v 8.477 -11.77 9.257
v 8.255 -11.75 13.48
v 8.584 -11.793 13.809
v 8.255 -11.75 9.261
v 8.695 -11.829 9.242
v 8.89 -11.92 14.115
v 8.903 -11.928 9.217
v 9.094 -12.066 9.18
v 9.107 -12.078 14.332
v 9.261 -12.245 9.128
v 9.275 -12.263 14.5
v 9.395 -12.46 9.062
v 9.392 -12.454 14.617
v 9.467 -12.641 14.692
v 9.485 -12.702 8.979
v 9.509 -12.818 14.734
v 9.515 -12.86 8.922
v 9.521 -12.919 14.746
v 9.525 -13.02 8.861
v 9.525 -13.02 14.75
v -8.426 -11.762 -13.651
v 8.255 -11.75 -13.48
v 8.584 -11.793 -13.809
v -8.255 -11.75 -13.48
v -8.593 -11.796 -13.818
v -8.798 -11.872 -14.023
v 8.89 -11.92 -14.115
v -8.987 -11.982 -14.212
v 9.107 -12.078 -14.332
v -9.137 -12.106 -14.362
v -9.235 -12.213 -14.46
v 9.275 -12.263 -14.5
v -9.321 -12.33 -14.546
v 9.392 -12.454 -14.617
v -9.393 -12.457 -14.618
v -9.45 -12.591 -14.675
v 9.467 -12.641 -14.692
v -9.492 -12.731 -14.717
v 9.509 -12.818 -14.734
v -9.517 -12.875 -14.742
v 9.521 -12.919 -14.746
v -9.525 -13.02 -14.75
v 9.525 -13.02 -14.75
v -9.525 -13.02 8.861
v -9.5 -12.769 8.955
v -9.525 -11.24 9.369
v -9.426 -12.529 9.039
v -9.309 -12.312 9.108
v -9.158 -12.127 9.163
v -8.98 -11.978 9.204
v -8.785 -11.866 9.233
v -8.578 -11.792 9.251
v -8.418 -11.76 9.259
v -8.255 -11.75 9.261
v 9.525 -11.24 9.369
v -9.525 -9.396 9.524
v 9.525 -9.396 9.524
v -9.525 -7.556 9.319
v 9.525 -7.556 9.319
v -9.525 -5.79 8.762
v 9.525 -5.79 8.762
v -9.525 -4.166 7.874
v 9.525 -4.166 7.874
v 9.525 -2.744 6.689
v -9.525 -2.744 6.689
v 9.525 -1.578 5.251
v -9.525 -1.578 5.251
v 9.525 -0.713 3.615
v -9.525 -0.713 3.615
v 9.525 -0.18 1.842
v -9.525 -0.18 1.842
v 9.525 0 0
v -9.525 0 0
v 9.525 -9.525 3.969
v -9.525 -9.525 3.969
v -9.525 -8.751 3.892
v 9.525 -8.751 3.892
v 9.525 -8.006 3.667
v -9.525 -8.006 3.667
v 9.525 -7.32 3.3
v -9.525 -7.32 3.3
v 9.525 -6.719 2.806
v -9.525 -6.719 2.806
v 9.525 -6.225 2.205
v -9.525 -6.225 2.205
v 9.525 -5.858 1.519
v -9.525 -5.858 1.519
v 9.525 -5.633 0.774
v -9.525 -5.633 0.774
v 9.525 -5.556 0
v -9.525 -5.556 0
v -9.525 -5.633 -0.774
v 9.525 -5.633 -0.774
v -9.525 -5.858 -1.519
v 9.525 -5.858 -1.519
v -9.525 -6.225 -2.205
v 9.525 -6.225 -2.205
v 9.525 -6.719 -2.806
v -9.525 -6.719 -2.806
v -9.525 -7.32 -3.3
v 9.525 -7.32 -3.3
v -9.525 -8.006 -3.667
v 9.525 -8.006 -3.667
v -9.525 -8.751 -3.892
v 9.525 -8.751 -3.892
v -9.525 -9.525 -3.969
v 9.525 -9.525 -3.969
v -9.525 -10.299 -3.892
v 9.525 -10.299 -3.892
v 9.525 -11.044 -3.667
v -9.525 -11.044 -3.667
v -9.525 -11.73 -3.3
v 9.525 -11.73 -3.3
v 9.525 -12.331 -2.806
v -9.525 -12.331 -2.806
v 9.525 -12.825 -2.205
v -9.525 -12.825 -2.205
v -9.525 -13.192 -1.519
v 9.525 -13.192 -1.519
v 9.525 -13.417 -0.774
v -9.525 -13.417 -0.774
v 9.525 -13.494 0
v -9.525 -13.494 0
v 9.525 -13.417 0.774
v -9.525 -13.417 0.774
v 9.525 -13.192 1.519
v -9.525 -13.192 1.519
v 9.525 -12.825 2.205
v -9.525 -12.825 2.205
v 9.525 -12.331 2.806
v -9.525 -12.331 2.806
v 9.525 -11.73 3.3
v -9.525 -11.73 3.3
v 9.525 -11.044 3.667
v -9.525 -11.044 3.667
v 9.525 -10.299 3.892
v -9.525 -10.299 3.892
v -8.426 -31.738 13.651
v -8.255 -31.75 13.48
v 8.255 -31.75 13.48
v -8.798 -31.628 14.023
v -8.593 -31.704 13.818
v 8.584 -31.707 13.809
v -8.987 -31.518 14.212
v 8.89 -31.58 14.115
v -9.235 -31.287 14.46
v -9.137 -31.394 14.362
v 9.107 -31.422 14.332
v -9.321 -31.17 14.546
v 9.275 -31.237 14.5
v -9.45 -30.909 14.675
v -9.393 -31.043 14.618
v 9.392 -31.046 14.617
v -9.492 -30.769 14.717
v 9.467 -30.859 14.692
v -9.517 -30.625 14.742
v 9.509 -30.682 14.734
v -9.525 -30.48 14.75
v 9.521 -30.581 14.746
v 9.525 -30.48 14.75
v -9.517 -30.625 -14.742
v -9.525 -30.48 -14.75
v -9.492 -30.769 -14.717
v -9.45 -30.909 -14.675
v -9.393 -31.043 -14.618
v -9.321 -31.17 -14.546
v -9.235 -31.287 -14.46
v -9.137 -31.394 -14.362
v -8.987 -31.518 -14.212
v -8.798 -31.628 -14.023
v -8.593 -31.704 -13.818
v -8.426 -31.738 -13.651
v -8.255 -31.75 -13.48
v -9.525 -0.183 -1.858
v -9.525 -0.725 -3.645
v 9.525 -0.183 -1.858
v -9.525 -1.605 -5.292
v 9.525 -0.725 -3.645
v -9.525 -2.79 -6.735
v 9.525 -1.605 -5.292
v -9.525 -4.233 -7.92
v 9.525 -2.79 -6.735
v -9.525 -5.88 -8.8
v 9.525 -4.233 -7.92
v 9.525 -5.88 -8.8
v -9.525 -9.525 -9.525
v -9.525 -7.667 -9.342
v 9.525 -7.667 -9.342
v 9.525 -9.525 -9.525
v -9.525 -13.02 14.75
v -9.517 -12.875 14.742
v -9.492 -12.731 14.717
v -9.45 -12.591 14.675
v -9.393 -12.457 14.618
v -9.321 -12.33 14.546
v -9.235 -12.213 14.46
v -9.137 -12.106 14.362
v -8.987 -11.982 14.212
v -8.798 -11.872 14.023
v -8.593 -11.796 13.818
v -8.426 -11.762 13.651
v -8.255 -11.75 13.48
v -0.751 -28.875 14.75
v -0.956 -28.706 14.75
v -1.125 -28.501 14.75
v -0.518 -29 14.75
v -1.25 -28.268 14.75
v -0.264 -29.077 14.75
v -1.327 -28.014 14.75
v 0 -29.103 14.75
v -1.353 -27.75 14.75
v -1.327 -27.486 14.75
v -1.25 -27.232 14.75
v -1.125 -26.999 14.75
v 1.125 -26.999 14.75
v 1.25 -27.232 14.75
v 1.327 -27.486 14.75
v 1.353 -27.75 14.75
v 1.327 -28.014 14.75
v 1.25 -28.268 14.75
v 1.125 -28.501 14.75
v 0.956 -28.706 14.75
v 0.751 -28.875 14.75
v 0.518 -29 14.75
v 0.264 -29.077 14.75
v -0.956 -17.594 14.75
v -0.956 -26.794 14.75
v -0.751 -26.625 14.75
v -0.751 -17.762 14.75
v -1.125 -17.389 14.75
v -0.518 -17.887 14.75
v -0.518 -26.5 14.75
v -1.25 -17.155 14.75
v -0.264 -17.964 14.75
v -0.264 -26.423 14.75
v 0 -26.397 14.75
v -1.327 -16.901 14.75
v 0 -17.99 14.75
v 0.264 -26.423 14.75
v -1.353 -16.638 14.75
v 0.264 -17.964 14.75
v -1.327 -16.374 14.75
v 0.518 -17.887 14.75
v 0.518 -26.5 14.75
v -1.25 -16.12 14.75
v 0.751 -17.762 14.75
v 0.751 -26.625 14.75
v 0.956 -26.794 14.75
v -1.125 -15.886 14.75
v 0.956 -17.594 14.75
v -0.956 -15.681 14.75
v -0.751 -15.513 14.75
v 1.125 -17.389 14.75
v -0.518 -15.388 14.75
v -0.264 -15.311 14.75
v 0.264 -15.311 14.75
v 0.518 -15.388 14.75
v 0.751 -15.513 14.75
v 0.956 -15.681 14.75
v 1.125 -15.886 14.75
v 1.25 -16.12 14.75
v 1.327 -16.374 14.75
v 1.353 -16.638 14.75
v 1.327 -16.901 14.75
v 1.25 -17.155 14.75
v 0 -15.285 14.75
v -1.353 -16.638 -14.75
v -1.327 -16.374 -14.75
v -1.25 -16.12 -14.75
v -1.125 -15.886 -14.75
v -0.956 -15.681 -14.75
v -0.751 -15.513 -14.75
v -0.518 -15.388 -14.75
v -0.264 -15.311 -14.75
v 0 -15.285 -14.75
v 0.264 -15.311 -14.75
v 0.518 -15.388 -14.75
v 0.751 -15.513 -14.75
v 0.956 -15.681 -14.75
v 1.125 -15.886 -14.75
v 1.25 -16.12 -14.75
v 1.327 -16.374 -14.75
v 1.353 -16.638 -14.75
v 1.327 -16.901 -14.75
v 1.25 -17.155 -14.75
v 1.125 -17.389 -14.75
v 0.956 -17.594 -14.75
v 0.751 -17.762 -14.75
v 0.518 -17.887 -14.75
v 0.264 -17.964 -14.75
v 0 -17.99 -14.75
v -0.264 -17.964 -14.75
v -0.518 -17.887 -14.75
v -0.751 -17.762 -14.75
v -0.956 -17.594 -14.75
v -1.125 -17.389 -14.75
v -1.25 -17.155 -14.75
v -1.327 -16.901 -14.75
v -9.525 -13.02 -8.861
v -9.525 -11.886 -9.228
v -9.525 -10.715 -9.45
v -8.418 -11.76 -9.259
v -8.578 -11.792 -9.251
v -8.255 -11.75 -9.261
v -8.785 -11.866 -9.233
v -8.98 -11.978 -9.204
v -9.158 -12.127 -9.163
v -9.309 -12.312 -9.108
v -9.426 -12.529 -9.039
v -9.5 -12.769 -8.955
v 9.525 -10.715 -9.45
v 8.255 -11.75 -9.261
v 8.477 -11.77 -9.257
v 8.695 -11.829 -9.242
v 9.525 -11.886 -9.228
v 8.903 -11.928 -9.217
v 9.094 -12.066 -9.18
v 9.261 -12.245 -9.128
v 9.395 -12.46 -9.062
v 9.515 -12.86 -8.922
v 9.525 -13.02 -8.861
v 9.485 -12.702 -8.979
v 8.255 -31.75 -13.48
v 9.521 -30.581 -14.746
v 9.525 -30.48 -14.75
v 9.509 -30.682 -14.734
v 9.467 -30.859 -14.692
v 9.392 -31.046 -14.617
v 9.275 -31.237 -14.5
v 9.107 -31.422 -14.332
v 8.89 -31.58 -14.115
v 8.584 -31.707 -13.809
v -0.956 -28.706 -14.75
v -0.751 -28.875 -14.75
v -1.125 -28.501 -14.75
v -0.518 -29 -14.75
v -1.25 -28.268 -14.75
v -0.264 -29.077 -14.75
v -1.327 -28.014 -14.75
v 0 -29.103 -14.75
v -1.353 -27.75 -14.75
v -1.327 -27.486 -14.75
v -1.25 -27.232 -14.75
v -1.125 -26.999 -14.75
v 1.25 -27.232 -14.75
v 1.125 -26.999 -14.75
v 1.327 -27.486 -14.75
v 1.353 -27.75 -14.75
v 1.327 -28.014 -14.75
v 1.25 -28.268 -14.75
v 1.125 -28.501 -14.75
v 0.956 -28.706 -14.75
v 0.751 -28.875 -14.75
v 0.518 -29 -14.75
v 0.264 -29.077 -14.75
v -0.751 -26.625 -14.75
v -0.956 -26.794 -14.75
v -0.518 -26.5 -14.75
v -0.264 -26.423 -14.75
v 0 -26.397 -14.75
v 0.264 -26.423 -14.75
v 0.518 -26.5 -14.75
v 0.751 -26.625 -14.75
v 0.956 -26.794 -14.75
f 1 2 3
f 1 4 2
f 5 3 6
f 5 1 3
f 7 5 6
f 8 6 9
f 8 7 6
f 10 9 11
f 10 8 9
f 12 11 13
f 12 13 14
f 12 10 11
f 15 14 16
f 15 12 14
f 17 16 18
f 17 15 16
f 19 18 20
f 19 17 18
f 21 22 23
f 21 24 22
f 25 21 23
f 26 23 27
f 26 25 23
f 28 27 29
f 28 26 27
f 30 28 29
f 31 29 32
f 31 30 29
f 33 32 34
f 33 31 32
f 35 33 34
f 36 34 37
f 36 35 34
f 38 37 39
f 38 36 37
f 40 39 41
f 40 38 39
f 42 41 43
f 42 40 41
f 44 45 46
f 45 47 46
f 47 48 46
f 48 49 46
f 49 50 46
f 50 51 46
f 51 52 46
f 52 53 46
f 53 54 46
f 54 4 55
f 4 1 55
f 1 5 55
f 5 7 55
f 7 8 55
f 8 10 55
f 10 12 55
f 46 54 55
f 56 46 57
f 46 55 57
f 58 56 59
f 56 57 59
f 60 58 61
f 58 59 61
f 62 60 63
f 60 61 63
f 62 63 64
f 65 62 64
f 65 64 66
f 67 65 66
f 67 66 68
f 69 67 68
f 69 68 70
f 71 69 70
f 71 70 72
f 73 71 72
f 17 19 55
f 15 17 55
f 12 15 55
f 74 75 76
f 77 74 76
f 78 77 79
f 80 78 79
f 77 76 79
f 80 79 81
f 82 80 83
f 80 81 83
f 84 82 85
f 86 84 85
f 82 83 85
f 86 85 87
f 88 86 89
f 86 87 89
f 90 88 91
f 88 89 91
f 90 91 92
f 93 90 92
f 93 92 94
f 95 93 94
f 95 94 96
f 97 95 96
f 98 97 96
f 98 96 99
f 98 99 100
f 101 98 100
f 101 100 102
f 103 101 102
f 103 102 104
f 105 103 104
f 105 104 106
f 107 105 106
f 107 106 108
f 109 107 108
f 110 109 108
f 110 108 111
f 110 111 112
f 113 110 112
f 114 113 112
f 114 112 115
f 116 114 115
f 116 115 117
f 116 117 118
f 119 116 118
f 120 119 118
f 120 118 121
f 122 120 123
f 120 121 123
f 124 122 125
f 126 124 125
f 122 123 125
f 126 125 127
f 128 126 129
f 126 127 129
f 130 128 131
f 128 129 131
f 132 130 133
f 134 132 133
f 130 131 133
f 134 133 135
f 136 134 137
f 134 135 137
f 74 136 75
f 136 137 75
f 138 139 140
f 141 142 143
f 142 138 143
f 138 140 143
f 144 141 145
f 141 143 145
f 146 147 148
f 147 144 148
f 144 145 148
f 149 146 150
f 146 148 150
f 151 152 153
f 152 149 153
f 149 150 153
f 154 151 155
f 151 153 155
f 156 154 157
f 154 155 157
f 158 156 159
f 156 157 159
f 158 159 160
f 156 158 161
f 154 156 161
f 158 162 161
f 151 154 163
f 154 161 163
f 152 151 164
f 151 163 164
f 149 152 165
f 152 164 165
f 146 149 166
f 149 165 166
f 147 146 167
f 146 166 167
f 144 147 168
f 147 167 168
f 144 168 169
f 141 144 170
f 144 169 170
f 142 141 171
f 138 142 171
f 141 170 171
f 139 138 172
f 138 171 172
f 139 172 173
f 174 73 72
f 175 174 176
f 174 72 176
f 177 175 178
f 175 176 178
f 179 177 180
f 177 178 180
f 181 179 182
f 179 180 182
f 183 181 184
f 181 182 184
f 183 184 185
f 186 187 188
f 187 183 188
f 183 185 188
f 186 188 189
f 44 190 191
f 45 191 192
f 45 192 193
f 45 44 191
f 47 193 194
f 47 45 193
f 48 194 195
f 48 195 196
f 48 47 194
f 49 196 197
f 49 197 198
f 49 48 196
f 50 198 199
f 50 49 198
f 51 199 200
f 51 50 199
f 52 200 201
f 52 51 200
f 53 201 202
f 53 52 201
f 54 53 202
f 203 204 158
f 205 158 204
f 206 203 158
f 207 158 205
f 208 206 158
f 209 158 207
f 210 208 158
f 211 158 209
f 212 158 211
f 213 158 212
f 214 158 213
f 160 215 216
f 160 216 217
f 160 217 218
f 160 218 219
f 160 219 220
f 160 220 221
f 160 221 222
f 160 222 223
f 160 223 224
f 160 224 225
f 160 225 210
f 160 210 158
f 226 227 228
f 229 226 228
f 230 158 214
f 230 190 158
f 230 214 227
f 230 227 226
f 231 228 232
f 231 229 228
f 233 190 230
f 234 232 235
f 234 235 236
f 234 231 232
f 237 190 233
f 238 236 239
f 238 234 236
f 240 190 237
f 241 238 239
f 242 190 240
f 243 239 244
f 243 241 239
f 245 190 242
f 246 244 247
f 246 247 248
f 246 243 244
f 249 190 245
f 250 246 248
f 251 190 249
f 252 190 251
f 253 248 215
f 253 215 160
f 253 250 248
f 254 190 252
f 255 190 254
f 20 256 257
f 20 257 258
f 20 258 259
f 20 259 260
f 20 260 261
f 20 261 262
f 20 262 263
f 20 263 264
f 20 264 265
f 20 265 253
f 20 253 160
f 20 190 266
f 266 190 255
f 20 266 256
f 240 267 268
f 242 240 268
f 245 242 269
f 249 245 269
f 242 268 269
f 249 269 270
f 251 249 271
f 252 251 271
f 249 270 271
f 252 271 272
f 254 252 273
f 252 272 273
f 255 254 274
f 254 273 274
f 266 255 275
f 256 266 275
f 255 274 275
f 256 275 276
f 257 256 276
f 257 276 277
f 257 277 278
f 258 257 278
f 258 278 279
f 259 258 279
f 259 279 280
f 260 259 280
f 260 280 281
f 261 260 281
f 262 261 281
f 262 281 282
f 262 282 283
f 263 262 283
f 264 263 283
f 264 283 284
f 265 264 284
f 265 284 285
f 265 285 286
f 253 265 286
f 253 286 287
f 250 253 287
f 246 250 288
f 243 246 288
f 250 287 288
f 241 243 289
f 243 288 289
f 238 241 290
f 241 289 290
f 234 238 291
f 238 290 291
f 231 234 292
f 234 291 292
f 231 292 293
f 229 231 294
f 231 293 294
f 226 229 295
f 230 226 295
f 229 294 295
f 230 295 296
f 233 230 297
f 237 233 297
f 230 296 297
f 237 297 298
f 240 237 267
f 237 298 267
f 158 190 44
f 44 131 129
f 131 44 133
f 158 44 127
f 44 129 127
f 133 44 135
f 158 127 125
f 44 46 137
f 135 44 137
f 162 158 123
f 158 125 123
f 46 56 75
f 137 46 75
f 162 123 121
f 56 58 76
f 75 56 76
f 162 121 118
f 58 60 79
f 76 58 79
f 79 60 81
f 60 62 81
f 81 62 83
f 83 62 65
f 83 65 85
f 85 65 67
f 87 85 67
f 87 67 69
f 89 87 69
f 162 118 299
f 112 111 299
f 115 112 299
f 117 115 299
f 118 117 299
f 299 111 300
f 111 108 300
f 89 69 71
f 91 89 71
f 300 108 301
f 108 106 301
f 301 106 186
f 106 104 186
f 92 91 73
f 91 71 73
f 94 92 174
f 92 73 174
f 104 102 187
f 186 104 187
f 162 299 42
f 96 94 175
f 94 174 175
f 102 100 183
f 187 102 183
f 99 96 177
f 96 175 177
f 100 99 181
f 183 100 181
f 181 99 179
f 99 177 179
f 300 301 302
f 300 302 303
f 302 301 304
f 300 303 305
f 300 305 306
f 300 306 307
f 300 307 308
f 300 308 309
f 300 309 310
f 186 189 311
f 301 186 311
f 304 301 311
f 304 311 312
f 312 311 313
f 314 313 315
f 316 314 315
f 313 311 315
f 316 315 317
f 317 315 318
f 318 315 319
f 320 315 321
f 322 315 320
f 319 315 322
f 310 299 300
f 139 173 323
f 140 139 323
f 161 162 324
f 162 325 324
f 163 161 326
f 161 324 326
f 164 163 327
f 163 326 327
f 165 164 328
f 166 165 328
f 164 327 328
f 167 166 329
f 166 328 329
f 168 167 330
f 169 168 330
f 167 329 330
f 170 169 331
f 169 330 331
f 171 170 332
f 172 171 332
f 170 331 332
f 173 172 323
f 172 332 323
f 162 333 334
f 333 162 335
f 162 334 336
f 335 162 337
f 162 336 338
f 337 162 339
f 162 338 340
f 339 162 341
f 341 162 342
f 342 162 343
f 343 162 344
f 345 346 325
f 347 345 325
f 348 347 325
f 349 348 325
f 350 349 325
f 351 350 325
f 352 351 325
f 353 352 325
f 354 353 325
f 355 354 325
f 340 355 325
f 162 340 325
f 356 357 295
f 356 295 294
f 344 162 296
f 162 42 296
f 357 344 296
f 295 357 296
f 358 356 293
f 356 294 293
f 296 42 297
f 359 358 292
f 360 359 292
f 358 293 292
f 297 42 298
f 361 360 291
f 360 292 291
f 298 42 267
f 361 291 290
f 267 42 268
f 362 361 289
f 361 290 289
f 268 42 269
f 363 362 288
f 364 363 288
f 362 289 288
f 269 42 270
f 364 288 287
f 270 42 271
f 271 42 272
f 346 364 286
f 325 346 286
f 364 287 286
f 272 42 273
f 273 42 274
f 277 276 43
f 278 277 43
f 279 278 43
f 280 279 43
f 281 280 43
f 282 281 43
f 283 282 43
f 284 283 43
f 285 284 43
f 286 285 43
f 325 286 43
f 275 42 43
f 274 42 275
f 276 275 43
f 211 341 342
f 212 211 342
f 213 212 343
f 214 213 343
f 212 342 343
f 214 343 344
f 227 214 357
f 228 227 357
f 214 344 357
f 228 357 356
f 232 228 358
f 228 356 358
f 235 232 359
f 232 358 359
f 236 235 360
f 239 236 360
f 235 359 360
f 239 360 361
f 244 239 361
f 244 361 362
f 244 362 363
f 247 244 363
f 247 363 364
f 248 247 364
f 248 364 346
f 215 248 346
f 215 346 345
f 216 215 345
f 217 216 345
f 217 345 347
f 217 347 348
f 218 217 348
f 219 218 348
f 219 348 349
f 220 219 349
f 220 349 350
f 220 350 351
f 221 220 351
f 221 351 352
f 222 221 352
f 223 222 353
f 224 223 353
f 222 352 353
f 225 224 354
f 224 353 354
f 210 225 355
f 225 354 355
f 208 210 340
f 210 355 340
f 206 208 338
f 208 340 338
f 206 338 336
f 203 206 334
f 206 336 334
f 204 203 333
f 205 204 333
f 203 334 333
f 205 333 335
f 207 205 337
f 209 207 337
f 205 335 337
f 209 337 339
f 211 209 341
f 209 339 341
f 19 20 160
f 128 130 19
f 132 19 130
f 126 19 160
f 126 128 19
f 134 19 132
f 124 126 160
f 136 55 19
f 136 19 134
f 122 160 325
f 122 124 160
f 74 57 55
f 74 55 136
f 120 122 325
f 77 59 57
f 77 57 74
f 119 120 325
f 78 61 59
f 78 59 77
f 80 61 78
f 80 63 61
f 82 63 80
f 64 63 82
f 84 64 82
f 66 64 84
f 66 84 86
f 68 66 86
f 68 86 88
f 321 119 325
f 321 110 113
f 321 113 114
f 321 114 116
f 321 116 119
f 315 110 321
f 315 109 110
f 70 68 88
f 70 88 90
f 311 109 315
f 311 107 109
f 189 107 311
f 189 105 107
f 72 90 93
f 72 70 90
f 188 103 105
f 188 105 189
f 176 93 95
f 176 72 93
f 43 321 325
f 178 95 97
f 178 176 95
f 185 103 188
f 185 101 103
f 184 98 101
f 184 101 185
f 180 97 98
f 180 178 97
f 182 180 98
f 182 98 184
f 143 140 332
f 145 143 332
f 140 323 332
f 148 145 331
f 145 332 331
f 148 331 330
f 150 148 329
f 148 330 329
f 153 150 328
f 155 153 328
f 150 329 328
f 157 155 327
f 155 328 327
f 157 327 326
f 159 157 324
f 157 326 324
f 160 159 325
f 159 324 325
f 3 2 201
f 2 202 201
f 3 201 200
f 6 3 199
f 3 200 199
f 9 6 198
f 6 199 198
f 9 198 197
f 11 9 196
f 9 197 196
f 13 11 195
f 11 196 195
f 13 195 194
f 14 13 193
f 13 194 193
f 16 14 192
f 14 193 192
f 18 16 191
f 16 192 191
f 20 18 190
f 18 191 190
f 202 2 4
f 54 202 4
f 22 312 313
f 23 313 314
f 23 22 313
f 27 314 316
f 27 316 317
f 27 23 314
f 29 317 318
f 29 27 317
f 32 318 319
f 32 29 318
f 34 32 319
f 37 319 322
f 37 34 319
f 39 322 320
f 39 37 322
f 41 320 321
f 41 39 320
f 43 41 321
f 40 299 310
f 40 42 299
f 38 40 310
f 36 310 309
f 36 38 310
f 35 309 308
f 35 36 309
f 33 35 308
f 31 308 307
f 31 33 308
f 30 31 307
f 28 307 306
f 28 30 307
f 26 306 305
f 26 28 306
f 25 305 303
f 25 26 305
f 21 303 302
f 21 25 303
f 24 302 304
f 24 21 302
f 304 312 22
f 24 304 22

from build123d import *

# Parameters (mm, degrees)
SKETCH1_W             = 19.05
SKETCH1_H             = 29.5
BODY_DEPTH            = 31.75
SKETCH8_R             = 3.96875
AXLE_HOLE_DEPTH       = 40.856335757
F_6_32_TAPPED_HOLE1_D = 2.7051
ROUND_OVER_DEPTH      = 40.856335757
FILLET1_R             = 1.27


with BuildPart() as part:
    # Sketch1 → Body (new body)
    with BuildSketch(Plane(origin=(0, 0, 0), x_dir=(1, 0, 0), z_dir=(0, 1, 0))):
        Rectangle(SKETCH1_W, SKETCH1_H)
    extrude(amount=-BODY_DEPTH)

    # Sketch8 → Axle Hole (cut, through all)
    with BuildSketch(Plane.ZY.offset(9.525)):
        with Locations((0, -9.525)):
            Circle(SKETCH8_R)
    extrude(amount=-AXLE_HOLE_DEPTH, mode=Mode.SUBTRACT)

    # #6-32 Tapped Hole1 (through all)
    with Locations(Plane(origin=(0, -27.75, 14.75), x_dir=(1, 0, 0), z_dir=(0, 0, 1))):
        with Locations((0, 0), (0, 11.1125)):
            Hole(F_6_32_TAPPED_HOLE1_D / 2)

    # Sketch10 → Round Over (cut, through all)
    with BuildSketch(Plane(origin=(9.525, 0, 0), x_dir=(0, 0, -1), z_dir=(1, 0, 0))):
        with BuildLine():
            Line((-14.75, 0), (-14.75, -11.75))
            Line((-14.75, -11.75), (-9.261479363, -11.75))
            ThreePointArc((-9.261479363, -11.75), (-7.480599909, -3.628708793), (0, 0))
            Line((0, 0), (-14.75, 0))
        make_face()
        with BuildLine():
            Line((14.75, 0), (0, 0))
            ThreePointArc((0, 0), (6.735192091, -2.789807909), (9.525, -9.525))
            ThreePointArc((9.525, -9.525), (9.45889042, -10.645275427), (9.261479363, -11.75))
            Line((9.261479363, -11.75), (14.75, -11.75))
            Line((14.75, -11.75), (14.75, 0))
        make_face()
    extrude(amount=-ROUND_OVER_DEPTH, mode=Mode.SUBTRACT)

    # Fillet1
    fillet1_edges = [part.edges().sort_by_distance(p)[0] for p in [
        (-9.525, -31.75, 0),
        (0, -31.75, 14.75),
        (-9.525, -11.75, 12.005739682),
        (0, -11.75, 14.75),
        (9.525, -11.75, 12.005739682),
        (9.525, -31.75, 0),
        (-9.525, -11.75, -12.005739682),
        (0, -11.75, -14.75),
        (9.525, -11.75, -12.005739682),
        (0, -31.75, -14.75),
    ]]
    fillet(fillet1_edges, radius=FILLET1_R)


solid = part.part
